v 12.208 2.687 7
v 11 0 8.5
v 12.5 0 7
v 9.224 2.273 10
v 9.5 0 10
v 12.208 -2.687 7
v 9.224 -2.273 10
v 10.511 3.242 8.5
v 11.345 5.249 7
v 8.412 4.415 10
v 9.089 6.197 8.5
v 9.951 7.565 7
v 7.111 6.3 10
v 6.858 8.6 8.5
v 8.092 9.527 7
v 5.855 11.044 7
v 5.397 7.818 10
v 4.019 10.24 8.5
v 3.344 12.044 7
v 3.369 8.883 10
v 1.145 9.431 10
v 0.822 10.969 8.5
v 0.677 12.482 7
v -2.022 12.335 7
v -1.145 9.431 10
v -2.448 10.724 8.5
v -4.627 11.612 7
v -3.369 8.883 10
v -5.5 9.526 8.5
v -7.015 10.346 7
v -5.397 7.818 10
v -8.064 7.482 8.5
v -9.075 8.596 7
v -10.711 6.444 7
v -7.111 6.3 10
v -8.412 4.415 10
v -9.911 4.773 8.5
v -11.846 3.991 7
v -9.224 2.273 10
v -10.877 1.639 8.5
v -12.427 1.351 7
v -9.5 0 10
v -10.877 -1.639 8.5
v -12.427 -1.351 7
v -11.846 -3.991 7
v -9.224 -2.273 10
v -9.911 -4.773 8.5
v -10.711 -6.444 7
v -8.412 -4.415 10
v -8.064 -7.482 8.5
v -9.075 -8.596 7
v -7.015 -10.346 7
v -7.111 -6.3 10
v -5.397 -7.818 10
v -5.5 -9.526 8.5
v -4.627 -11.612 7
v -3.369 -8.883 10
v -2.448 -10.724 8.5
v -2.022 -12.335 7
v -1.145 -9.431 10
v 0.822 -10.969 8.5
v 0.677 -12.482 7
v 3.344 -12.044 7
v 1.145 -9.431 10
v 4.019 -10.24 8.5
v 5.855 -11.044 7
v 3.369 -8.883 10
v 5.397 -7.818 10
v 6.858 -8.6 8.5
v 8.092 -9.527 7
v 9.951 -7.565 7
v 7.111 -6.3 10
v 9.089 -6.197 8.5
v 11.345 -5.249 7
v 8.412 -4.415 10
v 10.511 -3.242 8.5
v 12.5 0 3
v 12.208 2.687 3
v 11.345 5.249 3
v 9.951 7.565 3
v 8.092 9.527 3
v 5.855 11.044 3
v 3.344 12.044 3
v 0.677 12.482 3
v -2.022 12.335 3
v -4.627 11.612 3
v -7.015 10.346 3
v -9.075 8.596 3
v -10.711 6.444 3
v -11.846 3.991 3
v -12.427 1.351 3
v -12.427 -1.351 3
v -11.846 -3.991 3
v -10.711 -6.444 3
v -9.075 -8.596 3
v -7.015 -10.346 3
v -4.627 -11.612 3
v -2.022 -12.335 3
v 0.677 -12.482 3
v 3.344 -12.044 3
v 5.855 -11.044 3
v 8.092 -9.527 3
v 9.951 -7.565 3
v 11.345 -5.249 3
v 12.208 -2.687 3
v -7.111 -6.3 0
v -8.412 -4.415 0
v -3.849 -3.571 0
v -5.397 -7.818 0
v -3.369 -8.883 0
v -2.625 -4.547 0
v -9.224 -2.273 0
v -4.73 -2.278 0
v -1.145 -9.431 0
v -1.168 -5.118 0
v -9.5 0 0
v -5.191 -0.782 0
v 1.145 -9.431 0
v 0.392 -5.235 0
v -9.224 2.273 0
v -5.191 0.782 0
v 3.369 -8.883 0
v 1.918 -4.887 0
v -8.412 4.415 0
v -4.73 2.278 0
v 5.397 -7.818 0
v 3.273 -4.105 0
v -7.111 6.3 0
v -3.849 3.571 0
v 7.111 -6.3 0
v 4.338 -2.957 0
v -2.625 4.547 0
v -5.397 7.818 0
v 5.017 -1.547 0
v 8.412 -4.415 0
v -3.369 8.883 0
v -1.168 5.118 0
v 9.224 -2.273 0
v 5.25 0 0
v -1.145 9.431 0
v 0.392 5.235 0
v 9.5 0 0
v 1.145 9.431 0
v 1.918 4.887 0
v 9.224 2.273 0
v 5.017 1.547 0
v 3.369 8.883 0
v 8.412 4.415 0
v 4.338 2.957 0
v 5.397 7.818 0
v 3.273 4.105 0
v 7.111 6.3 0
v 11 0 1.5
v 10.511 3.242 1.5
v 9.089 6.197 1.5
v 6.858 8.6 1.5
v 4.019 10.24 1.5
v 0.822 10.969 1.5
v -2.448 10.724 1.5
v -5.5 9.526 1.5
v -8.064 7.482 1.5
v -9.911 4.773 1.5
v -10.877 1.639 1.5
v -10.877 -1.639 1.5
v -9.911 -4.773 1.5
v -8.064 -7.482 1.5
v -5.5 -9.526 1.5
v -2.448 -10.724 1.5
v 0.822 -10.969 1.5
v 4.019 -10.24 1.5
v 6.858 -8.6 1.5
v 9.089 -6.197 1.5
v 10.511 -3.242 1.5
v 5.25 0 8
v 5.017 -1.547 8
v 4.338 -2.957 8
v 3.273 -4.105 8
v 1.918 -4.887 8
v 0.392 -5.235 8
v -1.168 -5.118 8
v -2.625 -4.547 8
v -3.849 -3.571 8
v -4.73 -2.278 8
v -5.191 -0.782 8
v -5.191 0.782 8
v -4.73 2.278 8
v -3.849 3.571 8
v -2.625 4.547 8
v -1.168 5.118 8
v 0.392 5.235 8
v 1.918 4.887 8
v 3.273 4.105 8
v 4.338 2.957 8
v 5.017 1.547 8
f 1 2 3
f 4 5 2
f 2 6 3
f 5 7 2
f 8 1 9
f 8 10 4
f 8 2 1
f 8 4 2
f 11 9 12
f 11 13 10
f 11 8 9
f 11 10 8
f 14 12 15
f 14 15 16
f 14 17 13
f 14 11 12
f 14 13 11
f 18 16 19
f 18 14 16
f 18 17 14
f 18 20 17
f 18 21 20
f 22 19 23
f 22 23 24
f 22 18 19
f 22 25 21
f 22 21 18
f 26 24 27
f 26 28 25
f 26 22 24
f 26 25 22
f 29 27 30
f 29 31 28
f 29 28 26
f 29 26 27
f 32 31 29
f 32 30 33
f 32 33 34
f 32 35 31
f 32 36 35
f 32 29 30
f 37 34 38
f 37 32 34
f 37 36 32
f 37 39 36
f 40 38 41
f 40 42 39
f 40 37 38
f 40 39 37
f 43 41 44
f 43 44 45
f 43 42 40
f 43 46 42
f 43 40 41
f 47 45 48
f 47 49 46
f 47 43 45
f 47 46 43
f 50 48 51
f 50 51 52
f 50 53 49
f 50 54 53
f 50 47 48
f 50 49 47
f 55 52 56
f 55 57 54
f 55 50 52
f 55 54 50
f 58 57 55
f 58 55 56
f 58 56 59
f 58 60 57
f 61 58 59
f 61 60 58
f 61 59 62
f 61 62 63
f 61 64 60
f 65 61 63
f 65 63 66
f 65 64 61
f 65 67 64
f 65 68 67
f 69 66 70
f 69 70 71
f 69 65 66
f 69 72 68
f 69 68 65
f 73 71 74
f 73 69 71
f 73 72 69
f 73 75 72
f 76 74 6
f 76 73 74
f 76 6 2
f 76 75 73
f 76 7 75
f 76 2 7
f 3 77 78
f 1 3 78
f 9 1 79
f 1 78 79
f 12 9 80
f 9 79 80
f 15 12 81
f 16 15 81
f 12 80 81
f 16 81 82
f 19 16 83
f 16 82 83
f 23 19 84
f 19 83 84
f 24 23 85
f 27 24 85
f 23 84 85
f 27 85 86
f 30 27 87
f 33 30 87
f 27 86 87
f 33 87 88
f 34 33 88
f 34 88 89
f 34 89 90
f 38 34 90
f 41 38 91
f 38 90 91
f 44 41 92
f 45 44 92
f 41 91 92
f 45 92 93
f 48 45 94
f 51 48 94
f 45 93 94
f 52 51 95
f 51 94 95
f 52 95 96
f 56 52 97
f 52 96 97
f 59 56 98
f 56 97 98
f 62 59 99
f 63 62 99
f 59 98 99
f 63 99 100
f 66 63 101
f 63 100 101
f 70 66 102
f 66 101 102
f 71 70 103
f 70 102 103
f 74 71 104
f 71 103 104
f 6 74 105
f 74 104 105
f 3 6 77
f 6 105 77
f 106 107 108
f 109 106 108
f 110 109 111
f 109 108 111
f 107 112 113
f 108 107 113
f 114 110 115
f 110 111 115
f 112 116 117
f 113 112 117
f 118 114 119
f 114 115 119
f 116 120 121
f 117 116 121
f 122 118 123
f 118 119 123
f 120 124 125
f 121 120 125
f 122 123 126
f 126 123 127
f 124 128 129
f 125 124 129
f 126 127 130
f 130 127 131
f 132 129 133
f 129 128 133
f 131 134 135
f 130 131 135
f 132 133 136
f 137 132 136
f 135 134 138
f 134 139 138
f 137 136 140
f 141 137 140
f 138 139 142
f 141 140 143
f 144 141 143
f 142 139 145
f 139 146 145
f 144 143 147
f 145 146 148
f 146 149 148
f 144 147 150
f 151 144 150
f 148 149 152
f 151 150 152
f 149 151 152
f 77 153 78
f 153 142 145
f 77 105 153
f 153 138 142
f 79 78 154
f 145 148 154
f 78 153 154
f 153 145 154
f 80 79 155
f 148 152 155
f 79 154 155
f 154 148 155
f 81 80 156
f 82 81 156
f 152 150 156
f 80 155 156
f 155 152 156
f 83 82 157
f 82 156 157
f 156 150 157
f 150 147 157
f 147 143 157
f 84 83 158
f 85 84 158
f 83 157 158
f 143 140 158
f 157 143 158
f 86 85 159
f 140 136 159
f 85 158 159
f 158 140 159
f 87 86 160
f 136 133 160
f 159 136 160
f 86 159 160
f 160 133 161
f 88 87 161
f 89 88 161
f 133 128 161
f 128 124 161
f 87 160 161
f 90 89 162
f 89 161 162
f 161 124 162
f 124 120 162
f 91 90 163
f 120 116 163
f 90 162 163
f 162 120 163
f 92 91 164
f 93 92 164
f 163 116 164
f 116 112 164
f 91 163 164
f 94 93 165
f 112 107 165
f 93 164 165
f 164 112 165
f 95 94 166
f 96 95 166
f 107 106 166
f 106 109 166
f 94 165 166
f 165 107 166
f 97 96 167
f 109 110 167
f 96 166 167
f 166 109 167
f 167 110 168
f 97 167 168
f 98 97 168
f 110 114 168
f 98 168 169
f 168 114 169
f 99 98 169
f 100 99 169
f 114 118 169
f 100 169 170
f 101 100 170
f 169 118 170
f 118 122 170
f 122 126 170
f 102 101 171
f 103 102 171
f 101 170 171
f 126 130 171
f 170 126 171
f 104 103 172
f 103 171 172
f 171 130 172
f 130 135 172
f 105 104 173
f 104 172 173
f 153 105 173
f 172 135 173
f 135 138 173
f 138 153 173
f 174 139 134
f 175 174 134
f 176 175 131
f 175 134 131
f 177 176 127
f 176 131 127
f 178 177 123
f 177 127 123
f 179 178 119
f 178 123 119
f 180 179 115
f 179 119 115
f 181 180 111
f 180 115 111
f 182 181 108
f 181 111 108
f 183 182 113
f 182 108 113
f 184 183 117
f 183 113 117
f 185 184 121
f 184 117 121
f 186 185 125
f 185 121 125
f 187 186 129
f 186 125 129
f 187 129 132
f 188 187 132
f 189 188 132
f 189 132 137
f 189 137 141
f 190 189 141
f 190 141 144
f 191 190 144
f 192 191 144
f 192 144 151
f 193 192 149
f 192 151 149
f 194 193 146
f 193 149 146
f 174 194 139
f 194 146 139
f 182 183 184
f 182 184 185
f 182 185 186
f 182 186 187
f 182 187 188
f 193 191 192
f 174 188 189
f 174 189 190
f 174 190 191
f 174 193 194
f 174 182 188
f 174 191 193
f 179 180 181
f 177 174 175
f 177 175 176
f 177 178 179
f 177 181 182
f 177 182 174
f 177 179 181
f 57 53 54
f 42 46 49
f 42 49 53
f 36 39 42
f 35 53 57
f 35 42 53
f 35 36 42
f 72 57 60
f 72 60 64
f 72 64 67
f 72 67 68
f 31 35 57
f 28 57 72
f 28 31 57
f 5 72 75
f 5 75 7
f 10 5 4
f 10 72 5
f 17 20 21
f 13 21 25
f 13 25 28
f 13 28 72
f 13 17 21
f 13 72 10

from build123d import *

# Parameters (mm, degrees)
F0_R     = 12.5
F1_DEPTH = 10
F2_SIZE  = 3
F3_R     = 5.25
F4_DEPTH = 8


# Not quite as in the source:
# - a feature names something its author has since deleted; it is built from what else it names


with BuildPart() as f1:
    # F0 (on Top) → F1 (new body)
    with BuildSketch(Plane.XY):
        Circle(F0_R)
    extrude(amount=F1_DEPTH)

    # F2
    f2_edges = [f1.edges().sort_by_distance(p)[0] for p in [
        (-12.5, 0, 10),
        (12.5, 0, 5),
        (-12.5, 0, 0),
    ]]
    chamfer(f2_edges, length=F2_SIZE)

    # F3 (on face) → F4 (cut)
    with BuildSketch(Plane(origin=(0, 0, 0), x_dir=(1, 0, 0), z_dir=(0, 0, -1))):
        Circle(F3_R)
    extrude(amount=-F4_DEPTH, mode=Mode.SUBTRACT)


solid = f1.part
